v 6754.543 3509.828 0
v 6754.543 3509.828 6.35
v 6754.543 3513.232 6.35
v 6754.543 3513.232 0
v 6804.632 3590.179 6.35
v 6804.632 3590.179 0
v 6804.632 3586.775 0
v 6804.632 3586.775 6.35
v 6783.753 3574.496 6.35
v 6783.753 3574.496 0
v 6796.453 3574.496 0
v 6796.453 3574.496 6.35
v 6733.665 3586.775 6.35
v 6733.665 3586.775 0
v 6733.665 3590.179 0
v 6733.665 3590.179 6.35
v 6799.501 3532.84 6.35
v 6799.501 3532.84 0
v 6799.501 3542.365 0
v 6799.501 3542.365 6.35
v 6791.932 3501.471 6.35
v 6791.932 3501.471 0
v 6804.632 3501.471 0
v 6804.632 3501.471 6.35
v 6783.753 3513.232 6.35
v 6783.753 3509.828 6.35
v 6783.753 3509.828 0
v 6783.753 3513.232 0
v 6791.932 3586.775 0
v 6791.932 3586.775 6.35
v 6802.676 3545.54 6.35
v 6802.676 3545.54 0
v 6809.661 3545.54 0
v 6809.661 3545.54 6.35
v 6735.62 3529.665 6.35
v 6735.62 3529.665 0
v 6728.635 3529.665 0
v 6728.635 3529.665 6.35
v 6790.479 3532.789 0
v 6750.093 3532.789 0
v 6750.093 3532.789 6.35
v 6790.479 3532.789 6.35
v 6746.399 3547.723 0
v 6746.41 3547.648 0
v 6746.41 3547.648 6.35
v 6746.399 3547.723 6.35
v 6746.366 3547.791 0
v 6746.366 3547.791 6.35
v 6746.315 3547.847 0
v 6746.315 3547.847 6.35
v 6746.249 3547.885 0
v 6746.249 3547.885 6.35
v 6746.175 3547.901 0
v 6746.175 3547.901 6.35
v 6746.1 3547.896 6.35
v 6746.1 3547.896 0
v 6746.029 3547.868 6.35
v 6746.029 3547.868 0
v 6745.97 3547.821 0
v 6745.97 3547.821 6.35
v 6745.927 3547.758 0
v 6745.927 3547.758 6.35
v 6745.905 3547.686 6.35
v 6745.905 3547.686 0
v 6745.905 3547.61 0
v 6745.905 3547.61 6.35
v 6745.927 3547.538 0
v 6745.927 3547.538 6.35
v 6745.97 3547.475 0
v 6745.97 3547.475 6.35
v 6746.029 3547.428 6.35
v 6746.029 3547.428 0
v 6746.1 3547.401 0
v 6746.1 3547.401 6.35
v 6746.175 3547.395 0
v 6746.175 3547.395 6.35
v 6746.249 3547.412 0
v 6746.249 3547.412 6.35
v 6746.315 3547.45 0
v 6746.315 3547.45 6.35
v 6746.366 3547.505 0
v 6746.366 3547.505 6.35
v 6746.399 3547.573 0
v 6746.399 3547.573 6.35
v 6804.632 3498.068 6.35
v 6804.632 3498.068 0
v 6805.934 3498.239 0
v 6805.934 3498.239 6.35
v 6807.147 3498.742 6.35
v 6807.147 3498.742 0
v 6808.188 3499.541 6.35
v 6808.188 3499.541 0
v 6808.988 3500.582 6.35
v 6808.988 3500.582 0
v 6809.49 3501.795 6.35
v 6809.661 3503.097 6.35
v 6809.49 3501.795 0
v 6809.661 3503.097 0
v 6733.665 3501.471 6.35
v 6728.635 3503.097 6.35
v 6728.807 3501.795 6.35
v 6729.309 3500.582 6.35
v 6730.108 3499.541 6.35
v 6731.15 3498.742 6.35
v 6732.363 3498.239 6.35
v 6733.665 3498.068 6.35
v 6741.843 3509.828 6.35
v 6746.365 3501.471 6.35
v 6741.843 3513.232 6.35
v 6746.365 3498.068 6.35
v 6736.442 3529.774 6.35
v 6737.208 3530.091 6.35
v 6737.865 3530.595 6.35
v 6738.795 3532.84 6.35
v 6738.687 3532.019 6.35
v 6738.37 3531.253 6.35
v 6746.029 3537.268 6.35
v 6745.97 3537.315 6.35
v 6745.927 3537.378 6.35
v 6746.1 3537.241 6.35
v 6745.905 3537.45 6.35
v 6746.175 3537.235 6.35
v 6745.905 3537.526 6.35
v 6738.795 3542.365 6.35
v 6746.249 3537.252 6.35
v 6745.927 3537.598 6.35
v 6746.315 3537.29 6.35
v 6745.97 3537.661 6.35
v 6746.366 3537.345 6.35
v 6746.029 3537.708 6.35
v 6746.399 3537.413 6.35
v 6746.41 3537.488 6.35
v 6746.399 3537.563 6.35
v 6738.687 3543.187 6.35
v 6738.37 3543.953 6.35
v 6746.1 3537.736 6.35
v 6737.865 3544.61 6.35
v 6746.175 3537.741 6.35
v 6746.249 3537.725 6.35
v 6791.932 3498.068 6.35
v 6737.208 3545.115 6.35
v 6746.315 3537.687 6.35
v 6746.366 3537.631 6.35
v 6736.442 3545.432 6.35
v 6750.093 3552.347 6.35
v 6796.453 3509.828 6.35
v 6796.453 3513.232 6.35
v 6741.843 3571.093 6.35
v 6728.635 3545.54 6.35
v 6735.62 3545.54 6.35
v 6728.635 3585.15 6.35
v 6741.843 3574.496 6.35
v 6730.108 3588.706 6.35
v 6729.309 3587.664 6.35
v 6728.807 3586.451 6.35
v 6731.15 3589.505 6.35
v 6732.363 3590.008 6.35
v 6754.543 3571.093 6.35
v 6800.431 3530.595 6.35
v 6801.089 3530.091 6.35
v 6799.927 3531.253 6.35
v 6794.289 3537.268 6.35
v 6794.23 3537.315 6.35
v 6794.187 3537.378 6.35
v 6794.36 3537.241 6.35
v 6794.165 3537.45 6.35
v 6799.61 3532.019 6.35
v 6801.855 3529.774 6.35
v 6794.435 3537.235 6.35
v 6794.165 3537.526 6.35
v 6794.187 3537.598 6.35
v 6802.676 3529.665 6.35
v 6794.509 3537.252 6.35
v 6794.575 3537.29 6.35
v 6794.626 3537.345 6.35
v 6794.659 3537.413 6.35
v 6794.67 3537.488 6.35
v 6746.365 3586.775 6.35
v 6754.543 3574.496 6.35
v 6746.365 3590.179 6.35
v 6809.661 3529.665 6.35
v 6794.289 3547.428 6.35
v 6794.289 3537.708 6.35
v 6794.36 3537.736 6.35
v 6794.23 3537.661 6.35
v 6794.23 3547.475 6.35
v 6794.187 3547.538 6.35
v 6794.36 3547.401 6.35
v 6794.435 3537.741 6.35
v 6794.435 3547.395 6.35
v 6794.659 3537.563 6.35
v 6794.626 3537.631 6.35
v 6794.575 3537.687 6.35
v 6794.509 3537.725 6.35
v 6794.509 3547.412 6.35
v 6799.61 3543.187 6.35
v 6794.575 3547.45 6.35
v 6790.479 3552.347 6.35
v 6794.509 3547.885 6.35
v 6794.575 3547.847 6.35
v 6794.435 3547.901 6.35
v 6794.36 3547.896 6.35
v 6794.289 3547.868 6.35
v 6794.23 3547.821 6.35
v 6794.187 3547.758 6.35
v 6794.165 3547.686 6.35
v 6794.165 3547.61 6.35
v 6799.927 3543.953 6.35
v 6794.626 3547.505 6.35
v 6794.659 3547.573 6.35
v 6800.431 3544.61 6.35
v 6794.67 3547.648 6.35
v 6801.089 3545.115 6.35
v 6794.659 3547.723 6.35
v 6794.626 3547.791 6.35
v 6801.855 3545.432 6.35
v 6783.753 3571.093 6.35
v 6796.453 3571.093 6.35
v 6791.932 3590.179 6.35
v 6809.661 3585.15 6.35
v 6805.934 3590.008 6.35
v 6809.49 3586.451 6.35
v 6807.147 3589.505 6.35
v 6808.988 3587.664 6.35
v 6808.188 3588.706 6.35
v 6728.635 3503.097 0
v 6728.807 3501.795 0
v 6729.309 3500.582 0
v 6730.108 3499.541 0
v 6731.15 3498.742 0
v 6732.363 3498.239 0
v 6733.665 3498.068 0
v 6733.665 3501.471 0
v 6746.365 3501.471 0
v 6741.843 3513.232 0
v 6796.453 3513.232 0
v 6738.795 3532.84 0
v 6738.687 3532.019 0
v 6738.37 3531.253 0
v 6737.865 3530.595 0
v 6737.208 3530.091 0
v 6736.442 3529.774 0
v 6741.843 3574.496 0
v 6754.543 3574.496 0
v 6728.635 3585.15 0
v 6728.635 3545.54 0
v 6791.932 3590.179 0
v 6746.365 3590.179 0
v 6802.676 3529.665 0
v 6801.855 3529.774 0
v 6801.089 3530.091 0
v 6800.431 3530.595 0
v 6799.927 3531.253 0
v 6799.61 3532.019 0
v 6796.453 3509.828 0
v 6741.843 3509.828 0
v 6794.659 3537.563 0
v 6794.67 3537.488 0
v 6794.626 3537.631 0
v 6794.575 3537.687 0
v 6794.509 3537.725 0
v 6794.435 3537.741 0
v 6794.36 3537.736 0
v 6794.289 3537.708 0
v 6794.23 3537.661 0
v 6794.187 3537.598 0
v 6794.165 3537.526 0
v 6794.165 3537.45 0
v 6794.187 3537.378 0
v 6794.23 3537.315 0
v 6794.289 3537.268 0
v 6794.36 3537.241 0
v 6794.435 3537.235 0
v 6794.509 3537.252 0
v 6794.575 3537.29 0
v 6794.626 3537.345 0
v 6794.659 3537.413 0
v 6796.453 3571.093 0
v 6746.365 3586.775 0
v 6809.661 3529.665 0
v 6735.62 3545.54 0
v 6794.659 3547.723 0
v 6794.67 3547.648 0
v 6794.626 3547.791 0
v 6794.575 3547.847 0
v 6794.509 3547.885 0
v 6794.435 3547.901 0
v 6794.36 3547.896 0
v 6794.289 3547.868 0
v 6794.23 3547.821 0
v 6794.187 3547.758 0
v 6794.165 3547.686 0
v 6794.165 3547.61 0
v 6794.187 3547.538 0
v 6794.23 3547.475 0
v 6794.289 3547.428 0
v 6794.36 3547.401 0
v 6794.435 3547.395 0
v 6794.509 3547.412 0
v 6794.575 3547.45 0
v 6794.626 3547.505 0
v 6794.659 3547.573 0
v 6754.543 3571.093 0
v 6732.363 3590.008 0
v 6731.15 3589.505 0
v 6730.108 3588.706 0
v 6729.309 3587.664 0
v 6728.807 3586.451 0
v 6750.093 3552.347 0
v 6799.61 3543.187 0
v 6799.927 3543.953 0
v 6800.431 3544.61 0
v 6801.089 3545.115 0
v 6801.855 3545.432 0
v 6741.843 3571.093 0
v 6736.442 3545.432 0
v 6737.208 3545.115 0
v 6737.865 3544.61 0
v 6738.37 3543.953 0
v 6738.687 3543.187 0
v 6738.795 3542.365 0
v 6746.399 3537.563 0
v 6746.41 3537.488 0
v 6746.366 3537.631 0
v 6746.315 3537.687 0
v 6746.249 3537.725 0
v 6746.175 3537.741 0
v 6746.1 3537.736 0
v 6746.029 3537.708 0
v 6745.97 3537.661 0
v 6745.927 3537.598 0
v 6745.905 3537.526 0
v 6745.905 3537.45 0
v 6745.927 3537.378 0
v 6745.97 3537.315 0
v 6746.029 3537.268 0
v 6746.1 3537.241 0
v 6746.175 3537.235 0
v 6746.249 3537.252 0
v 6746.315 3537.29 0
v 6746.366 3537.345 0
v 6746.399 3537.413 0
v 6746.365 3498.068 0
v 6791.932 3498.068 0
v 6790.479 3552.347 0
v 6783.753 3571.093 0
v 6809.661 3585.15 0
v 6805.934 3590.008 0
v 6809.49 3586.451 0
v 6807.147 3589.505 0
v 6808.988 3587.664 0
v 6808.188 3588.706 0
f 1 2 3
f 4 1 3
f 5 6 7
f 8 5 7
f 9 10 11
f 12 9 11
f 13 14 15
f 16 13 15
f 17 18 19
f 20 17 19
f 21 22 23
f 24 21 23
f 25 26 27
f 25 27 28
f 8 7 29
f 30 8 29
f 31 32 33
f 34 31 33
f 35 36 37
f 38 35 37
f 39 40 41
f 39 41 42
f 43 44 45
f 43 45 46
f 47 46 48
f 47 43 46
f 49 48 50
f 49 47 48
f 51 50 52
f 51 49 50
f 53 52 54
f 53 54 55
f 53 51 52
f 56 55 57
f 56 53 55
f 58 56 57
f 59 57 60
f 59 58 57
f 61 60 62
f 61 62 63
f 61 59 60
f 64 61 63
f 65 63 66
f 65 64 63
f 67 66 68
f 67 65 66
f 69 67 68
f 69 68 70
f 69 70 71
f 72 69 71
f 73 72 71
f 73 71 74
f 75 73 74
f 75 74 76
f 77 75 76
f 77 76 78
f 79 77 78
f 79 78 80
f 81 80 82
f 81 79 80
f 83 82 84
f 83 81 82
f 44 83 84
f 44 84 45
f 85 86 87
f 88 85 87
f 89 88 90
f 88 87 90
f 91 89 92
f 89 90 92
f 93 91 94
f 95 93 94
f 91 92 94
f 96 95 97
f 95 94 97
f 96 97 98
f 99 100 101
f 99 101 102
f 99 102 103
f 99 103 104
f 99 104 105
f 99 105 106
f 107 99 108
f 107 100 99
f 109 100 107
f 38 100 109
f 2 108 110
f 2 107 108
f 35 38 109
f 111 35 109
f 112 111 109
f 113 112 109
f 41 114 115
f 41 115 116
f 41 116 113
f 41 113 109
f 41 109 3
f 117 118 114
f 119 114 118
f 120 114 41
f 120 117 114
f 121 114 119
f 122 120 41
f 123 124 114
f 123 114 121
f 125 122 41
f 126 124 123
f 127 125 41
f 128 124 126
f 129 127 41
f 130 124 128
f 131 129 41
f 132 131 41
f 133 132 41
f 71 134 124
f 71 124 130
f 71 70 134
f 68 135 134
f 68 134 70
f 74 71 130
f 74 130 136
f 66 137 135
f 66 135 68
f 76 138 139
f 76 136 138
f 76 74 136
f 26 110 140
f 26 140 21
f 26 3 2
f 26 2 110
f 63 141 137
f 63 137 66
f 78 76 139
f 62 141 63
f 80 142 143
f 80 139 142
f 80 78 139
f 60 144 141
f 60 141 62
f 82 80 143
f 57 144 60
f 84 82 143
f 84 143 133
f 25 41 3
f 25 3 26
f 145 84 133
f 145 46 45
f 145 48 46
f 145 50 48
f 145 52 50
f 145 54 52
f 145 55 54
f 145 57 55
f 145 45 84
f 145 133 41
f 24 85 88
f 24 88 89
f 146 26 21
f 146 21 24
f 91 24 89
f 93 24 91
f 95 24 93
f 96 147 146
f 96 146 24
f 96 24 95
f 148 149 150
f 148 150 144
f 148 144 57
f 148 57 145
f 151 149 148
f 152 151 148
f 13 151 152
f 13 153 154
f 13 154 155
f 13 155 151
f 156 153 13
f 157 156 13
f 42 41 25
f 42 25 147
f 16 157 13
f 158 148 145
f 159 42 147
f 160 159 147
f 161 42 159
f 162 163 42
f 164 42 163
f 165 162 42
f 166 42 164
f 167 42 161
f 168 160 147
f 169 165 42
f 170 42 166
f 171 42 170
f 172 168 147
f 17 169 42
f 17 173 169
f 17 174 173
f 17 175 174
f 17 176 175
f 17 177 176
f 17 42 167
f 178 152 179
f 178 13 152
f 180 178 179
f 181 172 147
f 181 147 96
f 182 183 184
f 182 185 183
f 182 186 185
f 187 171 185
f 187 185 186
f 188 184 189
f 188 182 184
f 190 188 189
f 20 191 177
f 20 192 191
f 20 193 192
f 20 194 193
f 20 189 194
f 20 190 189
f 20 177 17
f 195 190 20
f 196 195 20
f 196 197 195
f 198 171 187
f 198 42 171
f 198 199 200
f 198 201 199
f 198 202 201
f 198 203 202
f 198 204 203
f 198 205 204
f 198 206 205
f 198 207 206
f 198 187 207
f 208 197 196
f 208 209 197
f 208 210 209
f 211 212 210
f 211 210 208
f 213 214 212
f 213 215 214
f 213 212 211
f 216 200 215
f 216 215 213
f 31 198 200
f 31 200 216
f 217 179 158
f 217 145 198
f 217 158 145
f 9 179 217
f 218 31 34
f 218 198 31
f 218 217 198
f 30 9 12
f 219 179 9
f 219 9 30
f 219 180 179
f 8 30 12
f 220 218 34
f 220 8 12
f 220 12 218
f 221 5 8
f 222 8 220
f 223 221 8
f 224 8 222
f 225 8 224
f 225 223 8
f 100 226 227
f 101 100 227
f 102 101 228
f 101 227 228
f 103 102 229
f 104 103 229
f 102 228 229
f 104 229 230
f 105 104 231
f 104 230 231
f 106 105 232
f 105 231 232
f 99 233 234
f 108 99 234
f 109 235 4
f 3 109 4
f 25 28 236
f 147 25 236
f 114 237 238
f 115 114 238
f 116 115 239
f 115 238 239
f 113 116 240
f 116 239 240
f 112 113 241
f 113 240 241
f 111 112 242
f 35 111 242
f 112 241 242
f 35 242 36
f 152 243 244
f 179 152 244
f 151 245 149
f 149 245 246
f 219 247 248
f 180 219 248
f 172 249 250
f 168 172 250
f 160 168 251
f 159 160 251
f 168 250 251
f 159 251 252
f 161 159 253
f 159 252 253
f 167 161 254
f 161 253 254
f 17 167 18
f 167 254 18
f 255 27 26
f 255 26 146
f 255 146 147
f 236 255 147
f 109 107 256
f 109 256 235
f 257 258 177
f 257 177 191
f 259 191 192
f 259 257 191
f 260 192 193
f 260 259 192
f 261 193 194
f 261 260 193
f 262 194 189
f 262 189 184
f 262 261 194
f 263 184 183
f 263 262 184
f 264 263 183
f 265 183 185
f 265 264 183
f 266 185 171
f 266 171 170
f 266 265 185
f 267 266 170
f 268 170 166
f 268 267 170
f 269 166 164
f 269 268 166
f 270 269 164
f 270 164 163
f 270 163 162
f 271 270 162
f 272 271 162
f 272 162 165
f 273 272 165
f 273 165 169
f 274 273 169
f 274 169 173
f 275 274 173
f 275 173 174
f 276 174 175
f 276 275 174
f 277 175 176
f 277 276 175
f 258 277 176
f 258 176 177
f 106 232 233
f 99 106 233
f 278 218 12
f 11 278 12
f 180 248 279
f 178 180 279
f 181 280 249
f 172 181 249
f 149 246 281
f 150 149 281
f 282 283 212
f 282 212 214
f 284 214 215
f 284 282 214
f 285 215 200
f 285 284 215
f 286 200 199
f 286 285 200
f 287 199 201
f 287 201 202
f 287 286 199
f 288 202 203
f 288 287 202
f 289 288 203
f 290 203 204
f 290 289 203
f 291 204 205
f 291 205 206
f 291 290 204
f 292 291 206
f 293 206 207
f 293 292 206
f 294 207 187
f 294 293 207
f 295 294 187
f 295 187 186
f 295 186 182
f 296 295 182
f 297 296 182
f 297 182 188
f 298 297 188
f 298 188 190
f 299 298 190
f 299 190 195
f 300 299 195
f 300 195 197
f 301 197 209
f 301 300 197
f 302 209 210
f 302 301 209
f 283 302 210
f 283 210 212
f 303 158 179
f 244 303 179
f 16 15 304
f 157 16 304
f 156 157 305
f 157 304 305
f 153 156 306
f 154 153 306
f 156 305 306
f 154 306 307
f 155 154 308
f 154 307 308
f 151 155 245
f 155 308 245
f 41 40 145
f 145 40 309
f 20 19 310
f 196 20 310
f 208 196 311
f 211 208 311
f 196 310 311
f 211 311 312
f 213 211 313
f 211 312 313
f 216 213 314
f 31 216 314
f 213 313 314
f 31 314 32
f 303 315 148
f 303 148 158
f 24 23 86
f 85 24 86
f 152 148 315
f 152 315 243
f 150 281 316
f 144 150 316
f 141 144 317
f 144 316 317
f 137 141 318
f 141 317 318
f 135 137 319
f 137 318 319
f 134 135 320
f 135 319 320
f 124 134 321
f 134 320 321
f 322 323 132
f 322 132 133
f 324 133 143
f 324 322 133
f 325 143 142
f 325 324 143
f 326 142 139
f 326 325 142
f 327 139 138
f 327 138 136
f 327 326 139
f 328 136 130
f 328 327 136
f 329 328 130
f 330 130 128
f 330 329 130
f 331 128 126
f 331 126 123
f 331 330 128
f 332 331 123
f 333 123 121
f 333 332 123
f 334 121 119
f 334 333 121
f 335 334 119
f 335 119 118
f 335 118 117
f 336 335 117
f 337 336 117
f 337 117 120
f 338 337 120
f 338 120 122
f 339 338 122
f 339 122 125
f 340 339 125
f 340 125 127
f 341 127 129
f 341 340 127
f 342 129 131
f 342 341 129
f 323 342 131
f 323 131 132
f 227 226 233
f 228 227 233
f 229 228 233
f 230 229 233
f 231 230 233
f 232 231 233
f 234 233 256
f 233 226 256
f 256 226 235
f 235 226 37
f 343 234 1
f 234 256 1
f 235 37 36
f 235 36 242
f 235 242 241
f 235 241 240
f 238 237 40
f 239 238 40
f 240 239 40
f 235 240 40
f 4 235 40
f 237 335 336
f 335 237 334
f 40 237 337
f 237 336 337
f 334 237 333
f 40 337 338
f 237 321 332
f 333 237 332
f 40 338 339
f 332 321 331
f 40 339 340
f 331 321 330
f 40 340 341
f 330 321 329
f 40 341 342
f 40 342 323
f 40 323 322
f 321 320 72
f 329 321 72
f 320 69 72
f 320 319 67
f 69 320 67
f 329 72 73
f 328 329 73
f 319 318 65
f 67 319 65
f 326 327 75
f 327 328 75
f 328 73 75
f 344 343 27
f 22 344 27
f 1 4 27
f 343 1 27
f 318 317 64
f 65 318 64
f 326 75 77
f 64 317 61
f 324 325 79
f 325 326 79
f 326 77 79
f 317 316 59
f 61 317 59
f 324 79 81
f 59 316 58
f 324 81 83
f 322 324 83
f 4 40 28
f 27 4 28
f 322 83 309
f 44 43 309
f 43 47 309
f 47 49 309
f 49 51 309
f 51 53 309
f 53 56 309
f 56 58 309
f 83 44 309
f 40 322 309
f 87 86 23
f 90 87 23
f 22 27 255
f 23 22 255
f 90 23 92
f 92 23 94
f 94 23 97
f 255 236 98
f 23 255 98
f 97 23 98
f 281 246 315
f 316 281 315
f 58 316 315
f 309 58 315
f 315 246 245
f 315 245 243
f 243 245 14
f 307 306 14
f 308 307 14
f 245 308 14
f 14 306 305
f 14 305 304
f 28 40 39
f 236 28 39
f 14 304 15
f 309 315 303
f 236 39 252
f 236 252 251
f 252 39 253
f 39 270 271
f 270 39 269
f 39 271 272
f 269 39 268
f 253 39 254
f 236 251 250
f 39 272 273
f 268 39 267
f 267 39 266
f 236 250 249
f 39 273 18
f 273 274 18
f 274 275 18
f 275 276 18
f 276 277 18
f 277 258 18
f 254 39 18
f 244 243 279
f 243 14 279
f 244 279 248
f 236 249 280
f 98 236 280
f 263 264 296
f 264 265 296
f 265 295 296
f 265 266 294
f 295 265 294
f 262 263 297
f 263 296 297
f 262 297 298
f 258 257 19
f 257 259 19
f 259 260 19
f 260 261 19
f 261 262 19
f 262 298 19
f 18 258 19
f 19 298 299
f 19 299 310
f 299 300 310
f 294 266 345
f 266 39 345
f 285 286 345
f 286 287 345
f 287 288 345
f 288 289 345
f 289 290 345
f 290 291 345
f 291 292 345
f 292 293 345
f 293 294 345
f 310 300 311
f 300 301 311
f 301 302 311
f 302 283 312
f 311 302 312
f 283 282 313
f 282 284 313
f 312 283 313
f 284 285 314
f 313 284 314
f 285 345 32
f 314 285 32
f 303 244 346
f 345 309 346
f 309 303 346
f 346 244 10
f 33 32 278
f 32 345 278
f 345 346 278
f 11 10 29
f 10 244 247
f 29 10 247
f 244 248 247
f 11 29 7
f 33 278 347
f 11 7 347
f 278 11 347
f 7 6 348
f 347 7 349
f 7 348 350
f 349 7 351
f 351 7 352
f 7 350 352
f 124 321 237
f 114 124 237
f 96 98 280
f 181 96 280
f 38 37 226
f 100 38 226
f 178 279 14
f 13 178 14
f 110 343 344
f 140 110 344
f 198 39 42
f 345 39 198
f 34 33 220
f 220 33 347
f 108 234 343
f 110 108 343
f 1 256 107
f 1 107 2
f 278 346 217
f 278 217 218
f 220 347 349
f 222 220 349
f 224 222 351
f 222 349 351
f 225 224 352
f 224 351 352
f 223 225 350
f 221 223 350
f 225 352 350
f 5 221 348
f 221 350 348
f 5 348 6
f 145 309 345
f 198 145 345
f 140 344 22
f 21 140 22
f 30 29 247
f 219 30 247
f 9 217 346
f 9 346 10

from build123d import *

# Parameters (mm, degrees)
SKETCH1_R           = 0.254
SKETCH1_W           = 12.7
SKETCH1_H           = 3.4036
SKETCH1_W_2         = 40.386
SKETCH1_H_2         = 19.558
BOSS_EXTRUDE1_DEPTH = 6.35


with BuildPart() as part:
    # Sketch1 → Boss-Extrude1 (new body)
    with BuildSketch(Plane.XY):
        with BuildLine():
            Line((6728.635399657, 3585.149709448), (6728.635399657, 3545.54033771))
            Line((6728.635399657, 3545.54033771), (6735.620399657, 3545.54033771))
            ThreePointArc((6735.620399657, 3545.54033771), (6737.865463687, 3544.61040174), (6738.795399657, 3542.36533771))
            Line((6738.795399657, 3542.36533771), (6738.795399657, 3532.84033771))
            ThreePointArc((6738.795399657, 3532.84033771), (6737.865463687, 3530.595273679), (6735.620399657, 3529.66533771))
            Line((6735.620399657, 3529.66533771), (6728.635399657, 3529.66533771))
            Line((6728.635399657, 3529.66533771), (6728.635399657, 3503.09693771))
            ThreePointArc((6728.635399657, 3503.09693771), (6730.108418233, 3499.540756286), (6733.664599657, 3498.06773771))
            Line((6733.664599657, 3498.06773771), (6733.664599657, 3501.47133771))
            Line((6733.664599657, 3501.47133771), (6746.364599657, 3501.47133771))
            Line((6746.364599657, 3501.47133771), (6746.364599657, 3498.06773771))
            Line((6746.364599657, 3498.06773771), (6791.932199657, 3498.06773771))
            Line((6791.932199657, 3498.06773771), (6791.932199657, 3501.47133771))
            Line((6791.932199657, 3501.47133771), (6804.632199657, 3501.47133771))
            Line((6804.632199657, 3501.47133771), (6804.632199657, 3498.06773771))
            ThreePointArc((6804.632199657, 3498.06773771), (6808.188381081, 3499.540756286), (6809.661399657, 3503.09693771))
            Line((6809.661399657, 3503.09693771), (6809.661399657, 3529.66533771))
            Line((6809.661399657, 3529.66533771), (6802.676399657, 3529.66533771))
            ThreePointArc((6802.676399657, 3529.66533771), (6800.431335626, 3530.595273679), (6799.501399657, 3532.84033771))
            Line((6799.501399657, 3532.84033771), (6799.501399657, 3542.36533771))
            ThreePointArc((6799.501399657, 3542.36533771), (6800.431335626, 3544.61040174), (6802.676399657, 3545.54033771))
            Line((6802.676399657, 3545.54033771), (6809.661399657, 3545.54033771))
            Line((6809.661399657, 3545.54033771), (6809.661399657, 3585.149709448))
            ThreePointArc((6809.661399657, 3585.149709448), (6808.188381081, 3588.705890872), (6804.632199657, 3590.178909448))
            Line((6804.632199657, 3590.178909448), (6804.632199657, 3586.775309448))
            Line((6804.632199657, 3586.775309448), (6791.932199657, 3586.775309448))
            Line((6791.932199657, 3586.775309448), (6791.932199657, 3590.178909448))
            Line((6791.932199657, 3590.178909448), (6746.364599657, 3590.178909448))
            Line((6746.364599657, 3590.178909448), (6746.364599657, 3586.775309448))
            Line((6746.364599657, 3586.775309448), (6733.664599657, 3586.775309448))
            Line((6733.664599657, 3586.775309448), (6733.664599657, 3590.178909448))
            ThreePointArc((6733.664599657, 3590.178909448), (6730.108418233, 3588.705890872), (6728.635399657, 3585.149709448))
        make_face()
        with Locations((6794.416327778, 3547.648139787)):
            Circle(SKETCH1_R, mode=Mode.SUBTRACT)
        with Locations((6794.416327778, 3537.488139787)):
            Circle(SKETCH1_R, mode=Mode.SUBTRACT)
        with Locations((6746.156327778, 3547.648139787)):
            Circle(SKETCH1_R, mode=Mode.SUBTRACT)
        with Locations((6746.156327778, 3537.488139787)):
            Circle(SKETCH1_R, mode=Mode.SUBTRACT)
        with Locations((6748.193399657, 3511.52973771)):
            Rectangle(SKETCH1_W, SKETCH1_H, mode=Mode.SUBTRACT)
        with Locations((6790.103399657, 3511.52973771)):
            Rectangle(SKETCH1_W, SKETCH1_H, mode=Mode.SUBTRACT)
        with Locations((6790.103399657, 3572.79453771)):
            Rectangle(SKETCH1_W, SKETCH1_H, mode=Mode.SUBTRACT)
        with Locations((6748.193399657, 3572.79453771)):
            Rectangle(SKETCH1_W, SKETCH1_H, mode=Mode.SUBTRACT)
        with Locations((6770.286327778, 3542.568139787)):
            Rectangle(SKETCH1_W_2, SKETCH1_H_2, mode=Mode.SUBTRACT)
    extrude(amount=BOSS_EXTRUDE1_DEPTH)


solid = part.part
